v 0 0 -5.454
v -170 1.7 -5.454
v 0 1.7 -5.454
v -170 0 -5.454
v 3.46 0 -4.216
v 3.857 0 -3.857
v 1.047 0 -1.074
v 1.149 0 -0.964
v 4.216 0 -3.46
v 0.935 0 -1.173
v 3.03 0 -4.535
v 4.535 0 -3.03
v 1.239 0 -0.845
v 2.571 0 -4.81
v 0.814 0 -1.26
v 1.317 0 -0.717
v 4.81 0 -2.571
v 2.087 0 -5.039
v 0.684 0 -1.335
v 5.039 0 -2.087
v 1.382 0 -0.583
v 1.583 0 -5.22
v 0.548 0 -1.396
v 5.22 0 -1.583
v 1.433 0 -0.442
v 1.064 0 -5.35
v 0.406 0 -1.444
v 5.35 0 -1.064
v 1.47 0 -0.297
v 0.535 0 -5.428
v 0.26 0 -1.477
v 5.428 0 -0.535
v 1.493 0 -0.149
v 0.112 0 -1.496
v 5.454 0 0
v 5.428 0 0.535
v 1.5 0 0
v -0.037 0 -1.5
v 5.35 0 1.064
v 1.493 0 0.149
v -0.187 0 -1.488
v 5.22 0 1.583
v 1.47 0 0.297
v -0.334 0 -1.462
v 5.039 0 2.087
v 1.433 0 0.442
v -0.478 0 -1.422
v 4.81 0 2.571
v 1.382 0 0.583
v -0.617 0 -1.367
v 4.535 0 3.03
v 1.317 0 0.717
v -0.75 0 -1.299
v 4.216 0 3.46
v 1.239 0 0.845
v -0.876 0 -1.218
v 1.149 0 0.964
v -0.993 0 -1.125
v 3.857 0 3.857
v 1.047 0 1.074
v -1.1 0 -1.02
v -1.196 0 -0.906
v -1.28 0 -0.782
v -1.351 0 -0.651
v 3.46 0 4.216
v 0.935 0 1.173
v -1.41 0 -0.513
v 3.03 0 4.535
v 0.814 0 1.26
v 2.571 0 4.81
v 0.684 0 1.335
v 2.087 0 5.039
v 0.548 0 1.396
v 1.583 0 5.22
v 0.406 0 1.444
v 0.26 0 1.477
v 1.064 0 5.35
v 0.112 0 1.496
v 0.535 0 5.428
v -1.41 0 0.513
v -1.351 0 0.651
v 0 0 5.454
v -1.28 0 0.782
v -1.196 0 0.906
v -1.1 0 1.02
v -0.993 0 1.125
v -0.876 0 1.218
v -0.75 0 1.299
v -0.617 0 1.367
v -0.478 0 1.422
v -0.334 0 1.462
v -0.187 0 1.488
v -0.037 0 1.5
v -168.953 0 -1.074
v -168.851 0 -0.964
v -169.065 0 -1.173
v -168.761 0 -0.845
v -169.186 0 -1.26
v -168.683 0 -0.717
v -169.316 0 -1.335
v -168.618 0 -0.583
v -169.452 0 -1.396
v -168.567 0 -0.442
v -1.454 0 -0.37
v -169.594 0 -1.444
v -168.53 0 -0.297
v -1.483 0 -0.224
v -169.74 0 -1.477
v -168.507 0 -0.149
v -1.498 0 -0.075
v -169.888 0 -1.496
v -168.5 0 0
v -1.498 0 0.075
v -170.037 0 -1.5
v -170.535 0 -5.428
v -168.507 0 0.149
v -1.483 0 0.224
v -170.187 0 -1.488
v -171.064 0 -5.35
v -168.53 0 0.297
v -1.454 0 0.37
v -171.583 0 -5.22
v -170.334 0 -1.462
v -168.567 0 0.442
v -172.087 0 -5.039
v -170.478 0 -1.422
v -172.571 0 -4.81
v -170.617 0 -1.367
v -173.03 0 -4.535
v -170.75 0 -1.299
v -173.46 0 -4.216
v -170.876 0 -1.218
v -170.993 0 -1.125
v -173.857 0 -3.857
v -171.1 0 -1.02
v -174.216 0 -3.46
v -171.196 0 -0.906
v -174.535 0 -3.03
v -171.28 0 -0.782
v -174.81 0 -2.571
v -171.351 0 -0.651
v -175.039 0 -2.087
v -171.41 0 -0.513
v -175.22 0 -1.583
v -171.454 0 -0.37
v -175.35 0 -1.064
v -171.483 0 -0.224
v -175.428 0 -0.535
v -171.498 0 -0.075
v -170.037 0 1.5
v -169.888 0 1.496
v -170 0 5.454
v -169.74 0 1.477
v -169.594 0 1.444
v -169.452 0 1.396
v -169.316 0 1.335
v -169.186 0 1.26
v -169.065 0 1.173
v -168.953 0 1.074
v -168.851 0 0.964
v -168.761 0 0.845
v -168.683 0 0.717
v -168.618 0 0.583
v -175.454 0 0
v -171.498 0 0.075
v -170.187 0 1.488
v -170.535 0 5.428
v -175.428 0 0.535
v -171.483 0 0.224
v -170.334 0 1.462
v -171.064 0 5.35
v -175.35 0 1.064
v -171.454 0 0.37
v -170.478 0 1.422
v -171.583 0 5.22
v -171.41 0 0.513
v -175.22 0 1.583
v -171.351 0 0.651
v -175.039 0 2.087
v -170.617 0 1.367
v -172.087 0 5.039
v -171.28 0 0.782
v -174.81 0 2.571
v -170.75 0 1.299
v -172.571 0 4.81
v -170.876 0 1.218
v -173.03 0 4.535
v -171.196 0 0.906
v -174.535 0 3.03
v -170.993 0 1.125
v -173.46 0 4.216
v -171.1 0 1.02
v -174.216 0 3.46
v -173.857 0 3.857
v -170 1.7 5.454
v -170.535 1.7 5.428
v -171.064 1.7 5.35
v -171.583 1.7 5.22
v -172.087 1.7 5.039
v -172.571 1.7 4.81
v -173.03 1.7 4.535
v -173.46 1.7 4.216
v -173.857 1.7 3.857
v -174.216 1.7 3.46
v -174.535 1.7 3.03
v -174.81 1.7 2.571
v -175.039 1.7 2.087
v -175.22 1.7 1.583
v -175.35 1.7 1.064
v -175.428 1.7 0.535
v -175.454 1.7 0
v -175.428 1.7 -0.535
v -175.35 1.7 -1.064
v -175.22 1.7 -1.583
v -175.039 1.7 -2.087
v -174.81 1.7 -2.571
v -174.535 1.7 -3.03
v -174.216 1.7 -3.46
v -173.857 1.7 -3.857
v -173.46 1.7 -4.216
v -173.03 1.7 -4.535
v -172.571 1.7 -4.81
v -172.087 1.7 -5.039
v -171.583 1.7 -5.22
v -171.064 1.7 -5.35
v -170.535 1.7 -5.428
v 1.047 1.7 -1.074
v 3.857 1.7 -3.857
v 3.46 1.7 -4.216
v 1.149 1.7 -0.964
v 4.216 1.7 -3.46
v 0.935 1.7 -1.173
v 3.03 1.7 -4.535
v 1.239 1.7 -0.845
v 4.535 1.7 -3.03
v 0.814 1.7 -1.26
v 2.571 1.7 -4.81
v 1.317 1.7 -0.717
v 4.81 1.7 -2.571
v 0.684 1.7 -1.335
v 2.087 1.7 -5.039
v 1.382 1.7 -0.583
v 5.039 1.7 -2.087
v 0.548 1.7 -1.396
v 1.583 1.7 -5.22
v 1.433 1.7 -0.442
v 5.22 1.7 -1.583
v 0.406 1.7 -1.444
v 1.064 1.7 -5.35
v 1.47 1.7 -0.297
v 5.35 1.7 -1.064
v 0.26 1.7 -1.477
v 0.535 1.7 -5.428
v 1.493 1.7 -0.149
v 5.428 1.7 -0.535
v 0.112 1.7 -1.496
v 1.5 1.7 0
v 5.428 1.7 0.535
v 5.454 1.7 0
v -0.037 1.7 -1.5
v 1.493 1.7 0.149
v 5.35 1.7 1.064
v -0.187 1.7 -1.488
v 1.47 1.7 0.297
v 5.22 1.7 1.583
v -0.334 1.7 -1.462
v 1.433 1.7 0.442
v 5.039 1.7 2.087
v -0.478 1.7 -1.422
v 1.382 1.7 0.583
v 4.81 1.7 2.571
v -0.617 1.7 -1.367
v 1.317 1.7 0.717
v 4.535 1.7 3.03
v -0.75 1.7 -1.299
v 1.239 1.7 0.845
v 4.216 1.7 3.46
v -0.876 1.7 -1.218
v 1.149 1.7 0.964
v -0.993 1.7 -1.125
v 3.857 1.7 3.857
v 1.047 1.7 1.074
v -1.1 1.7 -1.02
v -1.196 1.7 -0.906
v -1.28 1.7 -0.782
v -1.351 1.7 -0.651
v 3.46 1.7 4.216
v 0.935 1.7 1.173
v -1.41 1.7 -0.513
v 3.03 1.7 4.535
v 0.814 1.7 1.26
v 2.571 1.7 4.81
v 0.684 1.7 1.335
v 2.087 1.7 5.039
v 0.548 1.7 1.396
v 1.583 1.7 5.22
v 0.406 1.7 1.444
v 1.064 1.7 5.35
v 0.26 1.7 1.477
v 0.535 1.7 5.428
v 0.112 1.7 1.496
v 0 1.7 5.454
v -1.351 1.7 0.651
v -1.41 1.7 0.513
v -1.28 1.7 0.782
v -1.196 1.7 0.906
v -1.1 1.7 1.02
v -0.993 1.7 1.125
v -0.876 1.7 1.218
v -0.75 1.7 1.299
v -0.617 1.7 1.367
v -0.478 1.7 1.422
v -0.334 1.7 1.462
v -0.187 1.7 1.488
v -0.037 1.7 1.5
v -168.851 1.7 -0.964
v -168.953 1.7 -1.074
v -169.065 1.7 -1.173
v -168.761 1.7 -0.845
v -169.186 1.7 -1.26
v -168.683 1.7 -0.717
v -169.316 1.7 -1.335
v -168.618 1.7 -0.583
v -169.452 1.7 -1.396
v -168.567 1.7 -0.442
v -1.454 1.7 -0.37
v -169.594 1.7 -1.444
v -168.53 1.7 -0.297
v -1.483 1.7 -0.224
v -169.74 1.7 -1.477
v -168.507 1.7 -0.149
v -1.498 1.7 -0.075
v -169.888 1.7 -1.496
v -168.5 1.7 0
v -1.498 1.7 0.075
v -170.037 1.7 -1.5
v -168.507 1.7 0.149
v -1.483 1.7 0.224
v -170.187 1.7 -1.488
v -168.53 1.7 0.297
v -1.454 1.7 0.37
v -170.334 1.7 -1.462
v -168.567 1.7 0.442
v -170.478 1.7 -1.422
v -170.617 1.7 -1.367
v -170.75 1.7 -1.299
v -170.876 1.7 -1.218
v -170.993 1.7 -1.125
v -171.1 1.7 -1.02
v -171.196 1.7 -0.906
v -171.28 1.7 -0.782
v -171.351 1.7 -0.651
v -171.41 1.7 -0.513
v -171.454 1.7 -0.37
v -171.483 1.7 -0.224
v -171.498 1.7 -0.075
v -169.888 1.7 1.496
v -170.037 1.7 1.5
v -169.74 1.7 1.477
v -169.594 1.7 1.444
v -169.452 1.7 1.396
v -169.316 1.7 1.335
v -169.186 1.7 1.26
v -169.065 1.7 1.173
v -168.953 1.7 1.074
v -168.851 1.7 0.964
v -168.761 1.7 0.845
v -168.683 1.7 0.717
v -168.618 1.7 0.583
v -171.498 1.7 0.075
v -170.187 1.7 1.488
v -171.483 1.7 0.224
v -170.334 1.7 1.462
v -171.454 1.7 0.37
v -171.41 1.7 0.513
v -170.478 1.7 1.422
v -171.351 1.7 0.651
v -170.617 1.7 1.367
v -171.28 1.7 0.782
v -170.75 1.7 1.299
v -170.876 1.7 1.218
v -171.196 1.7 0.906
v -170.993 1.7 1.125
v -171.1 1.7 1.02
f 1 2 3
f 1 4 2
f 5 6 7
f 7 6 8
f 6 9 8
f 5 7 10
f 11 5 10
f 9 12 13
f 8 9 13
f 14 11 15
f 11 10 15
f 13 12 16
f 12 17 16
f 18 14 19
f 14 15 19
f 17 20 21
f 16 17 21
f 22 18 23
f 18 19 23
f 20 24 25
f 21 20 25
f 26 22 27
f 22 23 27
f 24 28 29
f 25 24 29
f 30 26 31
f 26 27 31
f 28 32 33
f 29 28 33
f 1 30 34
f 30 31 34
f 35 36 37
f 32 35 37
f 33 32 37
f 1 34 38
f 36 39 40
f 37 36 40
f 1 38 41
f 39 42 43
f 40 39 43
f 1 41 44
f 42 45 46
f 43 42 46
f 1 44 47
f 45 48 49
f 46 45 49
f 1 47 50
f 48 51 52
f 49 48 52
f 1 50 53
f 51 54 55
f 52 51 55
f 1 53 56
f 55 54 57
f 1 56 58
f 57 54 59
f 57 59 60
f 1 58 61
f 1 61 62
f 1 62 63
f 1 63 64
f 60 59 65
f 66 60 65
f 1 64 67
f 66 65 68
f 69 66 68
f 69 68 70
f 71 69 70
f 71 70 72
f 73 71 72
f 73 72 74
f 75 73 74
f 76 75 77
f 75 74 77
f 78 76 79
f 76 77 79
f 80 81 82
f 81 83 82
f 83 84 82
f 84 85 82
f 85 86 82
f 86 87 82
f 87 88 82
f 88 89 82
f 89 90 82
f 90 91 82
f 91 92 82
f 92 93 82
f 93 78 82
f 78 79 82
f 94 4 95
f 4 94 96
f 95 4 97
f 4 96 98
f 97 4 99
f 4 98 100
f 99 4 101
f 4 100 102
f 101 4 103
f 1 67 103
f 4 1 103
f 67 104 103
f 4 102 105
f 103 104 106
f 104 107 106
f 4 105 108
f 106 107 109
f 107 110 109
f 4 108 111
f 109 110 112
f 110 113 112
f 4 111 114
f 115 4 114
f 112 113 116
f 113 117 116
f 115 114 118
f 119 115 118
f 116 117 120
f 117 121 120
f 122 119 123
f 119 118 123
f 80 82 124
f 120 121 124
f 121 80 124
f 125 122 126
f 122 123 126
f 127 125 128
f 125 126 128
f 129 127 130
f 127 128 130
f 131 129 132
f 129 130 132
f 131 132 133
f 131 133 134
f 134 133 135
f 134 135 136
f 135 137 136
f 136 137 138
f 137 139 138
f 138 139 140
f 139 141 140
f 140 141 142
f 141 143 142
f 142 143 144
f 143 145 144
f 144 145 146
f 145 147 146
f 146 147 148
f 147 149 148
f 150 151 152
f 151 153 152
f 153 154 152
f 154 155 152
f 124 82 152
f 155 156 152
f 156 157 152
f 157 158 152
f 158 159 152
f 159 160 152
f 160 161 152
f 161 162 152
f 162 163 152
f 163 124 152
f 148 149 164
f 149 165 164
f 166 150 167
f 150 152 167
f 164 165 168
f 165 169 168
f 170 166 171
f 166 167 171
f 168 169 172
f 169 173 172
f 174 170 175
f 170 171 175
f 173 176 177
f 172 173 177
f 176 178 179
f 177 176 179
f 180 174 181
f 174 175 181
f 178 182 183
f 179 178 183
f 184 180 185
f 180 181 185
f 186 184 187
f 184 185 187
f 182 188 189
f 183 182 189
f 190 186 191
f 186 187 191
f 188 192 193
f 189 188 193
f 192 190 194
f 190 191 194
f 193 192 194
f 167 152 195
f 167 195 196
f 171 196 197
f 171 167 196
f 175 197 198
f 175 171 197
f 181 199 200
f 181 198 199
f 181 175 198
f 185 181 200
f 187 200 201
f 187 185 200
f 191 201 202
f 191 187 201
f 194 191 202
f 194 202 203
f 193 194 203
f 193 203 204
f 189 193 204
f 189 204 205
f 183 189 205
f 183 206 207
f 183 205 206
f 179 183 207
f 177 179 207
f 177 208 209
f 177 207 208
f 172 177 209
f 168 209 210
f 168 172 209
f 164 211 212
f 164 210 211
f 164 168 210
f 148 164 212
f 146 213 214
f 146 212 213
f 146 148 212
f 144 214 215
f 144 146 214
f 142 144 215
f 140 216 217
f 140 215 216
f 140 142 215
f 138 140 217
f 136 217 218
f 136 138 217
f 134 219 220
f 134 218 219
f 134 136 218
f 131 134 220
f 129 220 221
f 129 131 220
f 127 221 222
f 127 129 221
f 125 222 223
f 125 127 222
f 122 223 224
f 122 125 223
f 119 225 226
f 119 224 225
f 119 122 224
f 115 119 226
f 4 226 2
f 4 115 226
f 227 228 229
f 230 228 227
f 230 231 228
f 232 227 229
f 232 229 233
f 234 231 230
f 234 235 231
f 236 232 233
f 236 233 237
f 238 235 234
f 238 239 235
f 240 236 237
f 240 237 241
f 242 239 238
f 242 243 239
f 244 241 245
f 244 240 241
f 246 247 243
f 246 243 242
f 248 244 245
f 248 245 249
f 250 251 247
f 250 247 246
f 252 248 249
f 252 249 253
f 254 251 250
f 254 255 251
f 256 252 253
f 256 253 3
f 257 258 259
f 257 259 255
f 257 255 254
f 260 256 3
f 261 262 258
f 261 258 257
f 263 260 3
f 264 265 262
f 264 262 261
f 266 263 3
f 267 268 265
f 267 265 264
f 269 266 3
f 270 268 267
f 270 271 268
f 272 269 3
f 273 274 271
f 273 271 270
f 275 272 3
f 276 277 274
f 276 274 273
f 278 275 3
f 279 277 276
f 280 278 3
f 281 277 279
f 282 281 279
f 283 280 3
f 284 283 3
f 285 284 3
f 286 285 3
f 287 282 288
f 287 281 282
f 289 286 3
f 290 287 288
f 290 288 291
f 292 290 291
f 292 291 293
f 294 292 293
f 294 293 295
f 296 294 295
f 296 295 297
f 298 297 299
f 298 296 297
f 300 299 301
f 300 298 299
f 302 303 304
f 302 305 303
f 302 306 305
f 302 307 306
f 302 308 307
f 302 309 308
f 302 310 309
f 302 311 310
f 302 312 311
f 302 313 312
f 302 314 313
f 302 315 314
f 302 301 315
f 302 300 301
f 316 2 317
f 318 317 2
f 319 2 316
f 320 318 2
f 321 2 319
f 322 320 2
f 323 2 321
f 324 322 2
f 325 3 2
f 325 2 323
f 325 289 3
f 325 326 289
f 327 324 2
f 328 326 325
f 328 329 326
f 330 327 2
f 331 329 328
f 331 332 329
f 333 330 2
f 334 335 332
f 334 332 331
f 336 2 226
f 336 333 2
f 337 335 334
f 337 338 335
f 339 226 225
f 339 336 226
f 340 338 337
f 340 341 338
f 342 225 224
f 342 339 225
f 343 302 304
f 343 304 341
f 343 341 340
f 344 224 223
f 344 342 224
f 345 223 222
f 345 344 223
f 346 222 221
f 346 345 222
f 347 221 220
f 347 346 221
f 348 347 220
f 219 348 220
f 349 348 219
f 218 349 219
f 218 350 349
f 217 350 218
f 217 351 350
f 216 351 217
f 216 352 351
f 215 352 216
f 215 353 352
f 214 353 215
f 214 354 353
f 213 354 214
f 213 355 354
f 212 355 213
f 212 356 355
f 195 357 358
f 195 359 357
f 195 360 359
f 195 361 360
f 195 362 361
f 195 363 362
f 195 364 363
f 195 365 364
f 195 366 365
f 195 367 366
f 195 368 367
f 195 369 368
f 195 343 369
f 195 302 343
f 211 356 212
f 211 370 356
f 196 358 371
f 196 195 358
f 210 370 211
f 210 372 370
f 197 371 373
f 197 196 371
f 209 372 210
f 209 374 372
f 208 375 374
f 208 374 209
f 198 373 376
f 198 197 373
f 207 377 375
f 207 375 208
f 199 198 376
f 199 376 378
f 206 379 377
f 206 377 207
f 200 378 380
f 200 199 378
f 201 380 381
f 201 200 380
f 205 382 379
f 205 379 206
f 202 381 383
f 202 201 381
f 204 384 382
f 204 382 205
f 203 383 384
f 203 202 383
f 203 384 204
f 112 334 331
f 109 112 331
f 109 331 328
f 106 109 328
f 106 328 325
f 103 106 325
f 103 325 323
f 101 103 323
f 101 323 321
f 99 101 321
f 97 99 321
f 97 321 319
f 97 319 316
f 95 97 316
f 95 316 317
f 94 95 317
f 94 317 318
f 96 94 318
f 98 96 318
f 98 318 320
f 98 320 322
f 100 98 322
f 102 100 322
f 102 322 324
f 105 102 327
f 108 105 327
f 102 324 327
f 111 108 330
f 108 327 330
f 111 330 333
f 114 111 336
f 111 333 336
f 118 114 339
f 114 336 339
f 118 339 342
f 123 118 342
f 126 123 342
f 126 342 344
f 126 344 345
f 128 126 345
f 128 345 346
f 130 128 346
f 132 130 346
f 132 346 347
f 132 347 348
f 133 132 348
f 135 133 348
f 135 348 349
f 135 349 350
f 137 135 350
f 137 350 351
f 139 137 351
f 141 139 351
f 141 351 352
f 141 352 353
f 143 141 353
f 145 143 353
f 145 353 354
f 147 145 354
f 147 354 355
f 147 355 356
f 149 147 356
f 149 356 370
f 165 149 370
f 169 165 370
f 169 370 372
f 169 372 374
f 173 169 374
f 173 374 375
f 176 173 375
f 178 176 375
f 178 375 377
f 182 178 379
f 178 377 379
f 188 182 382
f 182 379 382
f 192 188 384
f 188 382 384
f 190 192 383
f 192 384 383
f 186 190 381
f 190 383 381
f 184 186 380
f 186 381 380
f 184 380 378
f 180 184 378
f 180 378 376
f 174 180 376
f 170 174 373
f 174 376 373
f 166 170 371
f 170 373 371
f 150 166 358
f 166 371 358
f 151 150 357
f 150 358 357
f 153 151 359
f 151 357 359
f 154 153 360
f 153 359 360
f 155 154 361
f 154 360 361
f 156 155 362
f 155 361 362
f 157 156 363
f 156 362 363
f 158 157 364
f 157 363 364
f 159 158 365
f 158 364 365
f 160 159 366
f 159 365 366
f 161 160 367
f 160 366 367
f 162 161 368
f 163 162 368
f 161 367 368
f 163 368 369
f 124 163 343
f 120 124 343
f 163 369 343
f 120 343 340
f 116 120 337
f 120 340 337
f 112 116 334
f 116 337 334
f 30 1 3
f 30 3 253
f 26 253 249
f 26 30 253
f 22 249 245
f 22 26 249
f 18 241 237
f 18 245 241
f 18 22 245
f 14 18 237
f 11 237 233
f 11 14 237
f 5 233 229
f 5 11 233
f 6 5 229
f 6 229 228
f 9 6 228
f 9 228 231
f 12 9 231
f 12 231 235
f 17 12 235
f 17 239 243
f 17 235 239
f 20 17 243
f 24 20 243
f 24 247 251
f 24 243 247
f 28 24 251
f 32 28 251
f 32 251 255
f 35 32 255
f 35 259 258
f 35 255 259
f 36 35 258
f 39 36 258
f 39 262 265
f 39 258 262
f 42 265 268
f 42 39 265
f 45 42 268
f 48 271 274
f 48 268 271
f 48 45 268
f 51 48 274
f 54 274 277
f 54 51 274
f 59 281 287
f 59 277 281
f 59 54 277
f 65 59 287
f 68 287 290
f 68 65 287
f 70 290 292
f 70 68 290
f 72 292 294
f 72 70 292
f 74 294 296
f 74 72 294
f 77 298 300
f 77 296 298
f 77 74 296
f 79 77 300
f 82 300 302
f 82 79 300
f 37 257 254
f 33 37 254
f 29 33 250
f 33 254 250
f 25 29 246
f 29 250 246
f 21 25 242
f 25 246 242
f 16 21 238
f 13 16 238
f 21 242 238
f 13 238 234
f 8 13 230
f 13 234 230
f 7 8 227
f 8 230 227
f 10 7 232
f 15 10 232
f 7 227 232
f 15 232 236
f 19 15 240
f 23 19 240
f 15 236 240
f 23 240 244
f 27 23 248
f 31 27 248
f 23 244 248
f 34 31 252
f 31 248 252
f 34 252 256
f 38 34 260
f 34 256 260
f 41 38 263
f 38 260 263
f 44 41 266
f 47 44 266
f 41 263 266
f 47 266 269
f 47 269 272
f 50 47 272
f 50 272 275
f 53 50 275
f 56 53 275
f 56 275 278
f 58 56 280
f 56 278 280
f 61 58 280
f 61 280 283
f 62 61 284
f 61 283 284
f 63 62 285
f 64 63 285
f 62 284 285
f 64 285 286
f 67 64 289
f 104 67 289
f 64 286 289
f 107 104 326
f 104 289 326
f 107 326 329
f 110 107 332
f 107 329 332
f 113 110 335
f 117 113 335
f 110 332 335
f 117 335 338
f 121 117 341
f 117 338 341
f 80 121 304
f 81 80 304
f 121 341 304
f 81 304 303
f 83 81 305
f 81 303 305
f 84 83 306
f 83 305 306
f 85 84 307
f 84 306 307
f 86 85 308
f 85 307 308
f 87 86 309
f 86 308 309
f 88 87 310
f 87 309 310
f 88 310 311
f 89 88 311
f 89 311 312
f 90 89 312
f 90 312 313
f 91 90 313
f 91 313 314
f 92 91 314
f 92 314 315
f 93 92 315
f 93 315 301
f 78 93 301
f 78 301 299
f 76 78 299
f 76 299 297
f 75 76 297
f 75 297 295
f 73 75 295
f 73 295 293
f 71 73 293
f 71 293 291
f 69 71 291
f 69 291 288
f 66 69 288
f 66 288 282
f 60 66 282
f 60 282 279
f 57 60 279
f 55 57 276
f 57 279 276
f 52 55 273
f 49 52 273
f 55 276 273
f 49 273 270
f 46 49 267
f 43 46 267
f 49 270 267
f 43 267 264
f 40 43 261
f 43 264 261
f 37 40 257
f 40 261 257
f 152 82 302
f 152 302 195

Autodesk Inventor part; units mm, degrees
ref_plane "YZ Plane" through (0, 0, 0) normal (1, 0, 0) x (0, 1, 0)
ref_plane "XZ Plane" through (0, 0, 0) normal (0, 1, 0) x (-1, 0, 0)
ref_plane "XY Plane" through (0, 0, 0) normal (0, 0, 1) x (1, 0, 0)
sketch "Sketch1" plane through (0, 0, 0) normal (0, 1, 0) x (-1, 0, 0)
  arc A0 (0, 5.4545) -> (0, -5.4545) centre (0, 0) ccw
  arc A1 (170, -5.4545) -> (170, 5.4545) centre (170, 0) ccw
  line L0 (0, 5.4545) -> (170, 5.4545)
  line L1 (170, -5.4545) -> (0, -5.4545)
  dimension "d0" = 10.909
  dimension "d1" = 10.909
  dimension "d2" = 170
extrude "Extrusion1" add sketch "Sketch1" along normal blind 1.7
sketch "Sketch2" plane through (0, 1.7, 0) normal (0, 1, 0) x (1, 0, 0)
  arc A0 (0, -5.4545) -> (0, 5.4545) centre (0, 0) ccw projected
  arc A1 (-170, 5.4545) -> (-170, -5.4545) centre (-170, 0) ccw projected
  circle A2 centre (0, 0) radius 1.5
  circle A3 centre (-170, 0) radius 1.5
  dimension "d5" = 3
  dimension "d6" = 3
extrude "Extrusion2" cut sketch "Sketch2" against normal blind 1.7
equation "\"BendRadius\" = Thickness"
equation "\"BendReliefWidth\" = Thickness"
equation "\"BendReliefDepth\" = 0.5 * Thickness"
equation "\"CornerReliefSize\" = 4 * Thickness"
equation "\"MinimumRemnant\" = 2 * Thickness"
equation "\"TransitionRadius\" = BendRadius"
equation "\"JacobiRadiusSize\" = BendRadius"
equation "\"GapSize\" = Thickness"
equation "\"Thickness\" = 3.048"
properties part number "A1P2"
